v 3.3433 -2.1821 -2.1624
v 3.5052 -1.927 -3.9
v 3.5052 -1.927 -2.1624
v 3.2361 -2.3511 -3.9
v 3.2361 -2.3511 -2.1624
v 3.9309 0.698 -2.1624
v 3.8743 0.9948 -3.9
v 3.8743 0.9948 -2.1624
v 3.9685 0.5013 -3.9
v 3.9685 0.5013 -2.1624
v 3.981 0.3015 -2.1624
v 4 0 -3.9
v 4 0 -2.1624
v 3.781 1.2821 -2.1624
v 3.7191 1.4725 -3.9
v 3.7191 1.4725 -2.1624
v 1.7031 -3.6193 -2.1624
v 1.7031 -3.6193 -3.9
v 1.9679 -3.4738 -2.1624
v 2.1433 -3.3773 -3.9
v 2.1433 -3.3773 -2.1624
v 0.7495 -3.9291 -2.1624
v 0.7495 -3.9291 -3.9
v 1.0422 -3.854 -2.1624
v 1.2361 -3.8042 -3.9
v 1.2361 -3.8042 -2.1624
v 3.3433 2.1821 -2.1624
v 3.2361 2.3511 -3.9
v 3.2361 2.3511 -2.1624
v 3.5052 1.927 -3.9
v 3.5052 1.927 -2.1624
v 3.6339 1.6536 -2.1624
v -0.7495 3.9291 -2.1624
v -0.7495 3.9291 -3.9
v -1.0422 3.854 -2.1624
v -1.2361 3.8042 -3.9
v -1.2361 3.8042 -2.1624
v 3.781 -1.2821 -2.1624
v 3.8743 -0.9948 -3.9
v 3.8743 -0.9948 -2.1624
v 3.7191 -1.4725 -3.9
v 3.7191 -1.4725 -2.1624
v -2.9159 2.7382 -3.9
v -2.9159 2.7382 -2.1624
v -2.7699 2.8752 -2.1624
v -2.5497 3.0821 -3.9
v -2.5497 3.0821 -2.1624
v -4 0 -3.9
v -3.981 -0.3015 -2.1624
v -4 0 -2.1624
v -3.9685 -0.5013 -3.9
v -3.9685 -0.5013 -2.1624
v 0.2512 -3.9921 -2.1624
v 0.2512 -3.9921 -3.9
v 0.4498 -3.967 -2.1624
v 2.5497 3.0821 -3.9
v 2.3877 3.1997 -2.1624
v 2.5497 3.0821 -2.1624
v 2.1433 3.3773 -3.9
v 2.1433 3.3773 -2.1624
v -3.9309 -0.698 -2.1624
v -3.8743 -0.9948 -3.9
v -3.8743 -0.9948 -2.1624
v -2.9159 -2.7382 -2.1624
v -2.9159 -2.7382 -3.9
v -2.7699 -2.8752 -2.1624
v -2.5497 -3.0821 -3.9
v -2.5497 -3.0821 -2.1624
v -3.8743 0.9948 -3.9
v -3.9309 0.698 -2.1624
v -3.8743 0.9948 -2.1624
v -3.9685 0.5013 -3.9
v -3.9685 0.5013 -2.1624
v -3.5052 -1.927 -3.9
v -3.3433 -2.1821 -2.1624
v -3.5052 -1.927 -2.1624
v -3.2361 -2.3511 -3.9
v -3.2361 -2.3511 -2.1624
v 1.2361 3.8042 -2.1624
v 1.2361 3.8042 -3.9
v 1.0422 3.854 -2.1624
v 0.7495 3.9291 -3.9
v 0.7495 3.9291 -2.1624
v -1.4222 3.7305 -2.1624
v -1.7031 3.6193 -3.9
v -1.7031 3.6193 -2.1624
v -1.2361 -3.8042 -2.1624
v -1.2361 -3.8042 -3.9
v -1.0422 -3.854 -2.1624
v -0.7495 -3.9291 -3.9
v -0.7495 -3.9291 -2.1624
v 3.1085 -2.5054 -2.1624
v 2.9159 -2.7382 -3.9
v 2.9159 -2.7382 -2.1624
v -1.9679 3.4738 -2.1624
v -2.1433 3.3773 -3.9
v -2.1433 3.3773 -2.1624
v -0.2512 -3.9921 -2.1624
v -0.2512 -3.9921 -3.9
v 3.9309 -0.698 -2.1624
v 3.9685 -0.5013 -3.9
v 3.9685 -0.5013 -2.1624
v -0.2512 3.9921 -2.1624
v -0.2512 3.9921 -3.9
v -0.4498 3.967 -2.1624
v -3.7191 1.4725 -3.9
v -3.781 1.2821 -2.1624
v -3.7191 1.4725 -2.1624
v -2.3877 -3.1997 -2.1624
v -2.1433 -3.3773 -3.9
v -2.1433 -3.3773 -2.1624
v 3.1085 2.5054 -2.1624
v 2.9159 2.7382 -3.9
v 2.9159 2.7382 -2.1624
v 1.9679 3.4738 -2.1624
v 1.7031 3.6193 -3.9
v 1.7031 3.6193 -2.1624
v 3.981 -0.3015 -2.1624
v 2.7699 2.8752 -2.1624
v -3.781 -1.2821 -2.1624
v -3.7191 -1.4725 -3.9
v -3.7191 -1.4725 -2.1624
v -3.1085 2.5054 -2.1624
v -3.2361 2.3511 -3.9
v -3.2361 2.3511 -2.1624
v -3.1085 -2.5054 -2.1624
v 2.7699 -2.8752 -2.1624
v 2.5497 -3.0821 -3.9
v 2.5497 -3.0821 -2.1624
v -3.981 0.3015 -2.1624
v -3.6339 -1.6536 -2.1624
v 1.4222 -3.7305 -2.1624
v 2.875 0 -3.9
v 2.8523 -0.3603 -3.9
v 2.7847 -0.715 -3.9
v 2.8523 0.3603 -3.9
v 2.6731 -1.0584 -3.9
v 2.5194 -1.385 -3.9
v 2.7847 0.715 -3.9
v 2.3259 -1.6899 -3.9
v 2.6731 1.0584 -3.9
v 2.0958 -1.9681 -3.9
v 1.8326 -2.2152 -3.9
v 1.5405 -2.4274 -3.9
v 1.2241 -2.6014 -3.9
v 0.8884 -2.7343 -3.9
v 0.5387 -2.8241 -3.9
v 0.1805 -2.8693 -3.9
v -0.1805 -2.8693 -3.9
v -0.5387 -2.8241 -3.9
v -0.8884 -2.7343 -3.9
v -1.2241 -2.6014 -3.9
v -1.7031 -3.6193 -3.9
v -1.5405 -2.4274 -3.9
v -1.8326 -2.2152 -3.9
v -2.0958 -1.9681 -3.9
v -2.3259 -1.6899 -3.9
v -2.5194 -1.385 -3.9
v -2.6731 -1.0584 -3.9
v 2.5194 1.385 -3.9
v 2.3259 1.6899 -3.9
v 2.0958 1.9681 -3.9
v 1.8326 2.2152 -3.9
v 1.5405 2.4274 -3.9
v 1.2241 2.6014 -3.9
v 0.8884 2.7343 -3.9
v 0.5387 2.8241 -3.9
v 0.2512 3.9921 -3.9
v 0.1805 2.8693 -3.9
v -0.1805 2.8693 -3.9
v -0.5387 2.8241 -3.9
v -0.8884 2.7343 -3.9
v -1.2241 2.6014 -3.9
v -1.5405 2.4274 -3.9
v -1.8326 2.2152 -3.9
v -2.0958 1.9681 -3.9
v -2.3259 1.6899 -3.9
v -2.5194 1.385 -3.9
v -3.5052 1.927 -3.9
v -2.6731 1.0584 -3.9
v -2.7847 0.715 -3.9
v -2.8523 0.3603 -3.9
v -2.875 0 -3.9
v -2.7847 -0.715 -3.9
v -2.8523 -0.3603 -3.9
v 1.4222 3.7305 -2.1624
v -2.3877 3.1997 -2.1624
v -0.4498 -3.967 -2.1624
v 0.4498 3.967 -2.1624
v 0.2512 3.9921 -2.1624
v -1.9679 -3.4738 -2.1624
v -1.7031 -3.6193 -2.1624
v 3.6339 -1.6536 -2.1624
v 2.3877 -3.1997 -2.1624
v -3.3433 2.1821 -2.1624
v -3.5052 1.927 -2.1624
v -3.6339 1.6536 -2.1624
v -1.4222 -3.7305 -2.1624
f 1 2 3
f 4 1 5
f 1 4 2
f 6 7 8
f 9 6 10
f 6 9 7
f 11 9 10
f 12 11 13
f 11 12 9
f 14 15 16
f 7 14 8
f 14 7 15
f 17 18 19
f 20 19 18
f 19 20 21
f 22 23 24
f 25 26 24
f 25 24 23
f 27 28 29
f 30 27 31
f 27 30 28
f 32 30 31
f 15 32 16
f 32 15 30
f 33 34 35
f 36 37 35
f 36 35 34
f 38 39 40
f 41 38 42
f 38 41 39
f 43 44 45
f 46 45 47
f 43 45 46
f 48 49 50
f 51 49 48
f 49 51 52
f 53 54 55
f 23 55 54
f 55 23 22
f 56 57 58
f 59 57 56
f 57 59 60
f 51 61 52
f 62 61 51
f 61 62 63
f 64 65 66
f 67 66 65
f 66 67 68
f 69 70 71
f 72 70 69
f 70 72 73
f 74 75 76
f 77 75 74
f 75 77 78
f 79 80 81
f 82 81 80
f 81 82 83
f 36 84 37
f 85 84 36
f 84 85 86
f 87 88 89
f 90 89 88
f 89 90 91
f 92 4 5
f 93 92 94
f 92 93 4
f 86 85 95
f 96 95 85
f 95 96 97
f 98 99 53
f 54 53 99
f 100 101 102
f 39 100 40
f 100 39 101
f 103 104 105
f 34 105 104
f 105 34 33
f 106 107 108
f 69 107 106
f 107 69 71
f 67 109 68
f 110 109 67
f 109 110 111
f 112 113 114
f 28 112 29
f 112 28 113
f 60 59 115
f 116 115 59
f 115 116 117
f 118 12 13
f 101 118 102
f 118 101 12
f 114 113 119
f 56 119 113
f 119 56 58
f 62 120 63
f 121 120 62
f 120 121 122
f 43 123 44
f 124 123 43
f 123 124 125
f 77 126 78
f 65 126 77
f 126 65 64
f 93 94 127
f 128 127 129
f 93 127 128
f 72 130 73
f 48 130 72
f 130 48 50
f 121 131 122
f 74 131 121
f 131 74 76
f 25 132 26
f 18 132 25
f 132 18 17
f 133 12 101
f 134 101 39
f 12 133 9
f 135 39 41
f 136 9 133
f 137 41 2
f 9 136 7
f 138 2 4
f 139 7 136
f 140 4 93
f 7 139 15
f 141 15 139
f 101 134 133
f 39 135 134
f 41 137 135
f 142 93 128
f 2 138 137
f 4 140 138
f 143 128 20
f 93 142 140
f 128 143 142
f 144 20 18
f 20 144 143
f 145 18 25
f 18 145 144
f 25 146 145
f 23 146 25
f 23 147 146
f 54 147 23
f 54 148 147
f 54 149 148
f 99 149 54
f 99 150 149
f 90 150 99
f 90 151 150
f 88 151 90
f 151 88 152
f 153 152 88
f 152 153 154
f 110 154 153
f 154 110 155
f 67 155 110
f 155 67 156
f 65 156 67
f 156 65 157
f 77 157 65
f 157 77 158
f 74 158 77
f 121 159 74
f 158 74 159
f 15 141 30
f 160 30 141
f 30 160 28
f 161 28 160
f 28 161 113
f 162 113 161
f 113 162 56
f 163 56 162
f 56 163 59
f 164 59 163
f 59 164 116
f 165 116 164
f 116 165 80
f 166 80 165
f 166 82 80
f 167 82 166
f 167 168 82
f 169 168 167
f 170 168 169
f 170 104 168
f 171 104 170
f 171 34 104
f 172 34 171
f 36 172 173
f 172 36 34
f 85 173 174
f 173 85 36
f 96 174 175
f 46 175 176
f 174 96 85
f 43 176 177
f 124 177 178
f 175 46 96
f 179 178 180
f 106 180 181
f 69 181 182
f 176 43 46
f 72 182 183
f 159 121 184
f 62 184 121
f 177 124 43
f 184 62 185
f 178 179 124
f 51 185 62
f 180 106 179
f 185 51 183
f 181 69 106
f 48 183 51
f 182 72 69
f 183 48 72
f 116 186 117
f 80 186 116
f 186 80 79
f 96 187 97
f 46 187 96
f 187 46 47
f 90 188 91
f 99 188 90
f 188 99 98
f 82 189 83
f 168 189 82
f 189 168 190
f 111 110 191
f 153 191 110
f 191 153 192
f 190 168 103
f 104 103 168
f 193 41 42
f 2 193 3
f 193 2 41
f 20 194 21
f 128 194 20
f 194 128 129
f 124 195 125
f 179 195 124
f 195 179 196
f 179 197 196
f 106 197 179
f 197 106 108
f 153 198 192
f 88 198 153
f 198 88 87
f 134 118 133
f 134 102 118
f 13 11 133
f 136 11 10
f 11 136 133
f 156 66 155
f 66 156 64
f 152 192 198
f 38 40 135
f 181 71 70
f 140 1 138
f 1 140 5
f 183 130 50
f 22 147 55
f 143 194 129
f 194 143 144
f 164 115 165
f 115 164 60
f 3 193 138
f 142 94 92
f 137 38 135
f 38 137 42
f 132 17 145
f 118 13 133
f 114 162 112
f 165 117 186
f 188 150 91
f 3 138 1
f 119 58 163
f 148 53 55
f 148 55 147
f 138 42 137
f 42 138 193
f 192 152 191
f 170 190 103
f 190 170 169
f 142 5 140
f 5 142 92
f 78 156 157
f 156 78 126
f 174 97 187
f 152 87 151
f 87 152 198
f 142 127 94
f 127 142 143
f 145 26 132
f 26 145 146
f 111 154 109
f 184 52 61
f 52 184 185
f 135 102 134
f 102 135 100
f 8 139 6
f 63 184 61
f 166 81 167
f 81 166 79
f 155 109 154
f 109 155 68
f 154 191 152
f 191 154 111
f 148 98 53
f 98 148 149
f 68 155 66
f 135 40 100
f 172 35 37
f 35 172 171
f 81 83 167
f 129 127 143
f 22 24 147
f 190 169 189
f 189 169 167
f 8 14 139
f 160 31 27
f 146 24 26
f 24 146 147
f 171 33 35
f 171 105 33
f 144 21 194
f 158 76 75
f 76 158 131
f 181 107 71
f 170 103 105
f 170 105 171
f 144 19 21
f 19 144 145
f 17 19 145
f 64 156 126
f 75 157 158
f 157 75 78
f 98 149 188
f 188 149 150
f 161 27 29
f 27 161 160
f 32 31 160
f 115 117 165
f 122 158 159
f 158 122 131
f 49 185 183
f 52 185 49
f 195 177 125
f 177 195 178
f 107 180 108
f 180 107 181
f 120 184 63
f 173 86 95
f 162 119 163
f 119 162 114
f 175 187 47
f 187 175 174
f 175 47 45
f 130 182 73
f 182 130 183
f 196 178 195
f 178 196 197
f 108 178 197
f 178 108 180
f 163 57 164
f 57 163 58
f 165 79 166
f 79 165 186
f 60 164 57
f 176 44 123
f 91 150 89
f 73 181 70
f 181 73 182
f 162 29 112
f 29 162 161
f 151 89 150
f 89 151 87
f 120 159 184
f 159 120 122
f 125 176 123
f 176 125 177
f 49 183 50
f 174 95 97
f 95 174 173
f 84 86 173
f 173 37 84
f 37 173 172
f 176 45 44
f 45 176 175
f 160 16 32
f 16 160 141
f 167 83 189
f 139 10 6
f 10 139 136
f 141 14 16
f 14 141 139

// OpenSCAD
$fn = 50;

difference() {
	union() {
		translate(v = [0, 0, -3.9]) {
			cylinder(h = 3.9, r = 4.0);
		}
		#translate(v = [0, 0, -6.9]) {
			cylinder(h = 6.9, r = 2.875);
		}
	}
	union() {
		translate(v = [0, 0, 0]) {
			rotate(a = [0, 0, 0]) {
				difference() {
					union() {
						translate(v = [0, 0, -6.9]) {
							cylinder(h = 6.9, r = 2.6);
						}
						translate(v = [0, 0, -3.9]) {
							cylinder(h = 3.9, r1 = 2.875, r2 = 5.4);
						}
						translate(v = [0, 0, -6.9]) {
							cylinder(h = 6.9, r = 2.875);
						}
						translate(v = [0, 0, -6.9]) {
							cylinder(h = 6.9, r = 2.6);
						}
					}
					union();
				}
			}
		}
	}
}
